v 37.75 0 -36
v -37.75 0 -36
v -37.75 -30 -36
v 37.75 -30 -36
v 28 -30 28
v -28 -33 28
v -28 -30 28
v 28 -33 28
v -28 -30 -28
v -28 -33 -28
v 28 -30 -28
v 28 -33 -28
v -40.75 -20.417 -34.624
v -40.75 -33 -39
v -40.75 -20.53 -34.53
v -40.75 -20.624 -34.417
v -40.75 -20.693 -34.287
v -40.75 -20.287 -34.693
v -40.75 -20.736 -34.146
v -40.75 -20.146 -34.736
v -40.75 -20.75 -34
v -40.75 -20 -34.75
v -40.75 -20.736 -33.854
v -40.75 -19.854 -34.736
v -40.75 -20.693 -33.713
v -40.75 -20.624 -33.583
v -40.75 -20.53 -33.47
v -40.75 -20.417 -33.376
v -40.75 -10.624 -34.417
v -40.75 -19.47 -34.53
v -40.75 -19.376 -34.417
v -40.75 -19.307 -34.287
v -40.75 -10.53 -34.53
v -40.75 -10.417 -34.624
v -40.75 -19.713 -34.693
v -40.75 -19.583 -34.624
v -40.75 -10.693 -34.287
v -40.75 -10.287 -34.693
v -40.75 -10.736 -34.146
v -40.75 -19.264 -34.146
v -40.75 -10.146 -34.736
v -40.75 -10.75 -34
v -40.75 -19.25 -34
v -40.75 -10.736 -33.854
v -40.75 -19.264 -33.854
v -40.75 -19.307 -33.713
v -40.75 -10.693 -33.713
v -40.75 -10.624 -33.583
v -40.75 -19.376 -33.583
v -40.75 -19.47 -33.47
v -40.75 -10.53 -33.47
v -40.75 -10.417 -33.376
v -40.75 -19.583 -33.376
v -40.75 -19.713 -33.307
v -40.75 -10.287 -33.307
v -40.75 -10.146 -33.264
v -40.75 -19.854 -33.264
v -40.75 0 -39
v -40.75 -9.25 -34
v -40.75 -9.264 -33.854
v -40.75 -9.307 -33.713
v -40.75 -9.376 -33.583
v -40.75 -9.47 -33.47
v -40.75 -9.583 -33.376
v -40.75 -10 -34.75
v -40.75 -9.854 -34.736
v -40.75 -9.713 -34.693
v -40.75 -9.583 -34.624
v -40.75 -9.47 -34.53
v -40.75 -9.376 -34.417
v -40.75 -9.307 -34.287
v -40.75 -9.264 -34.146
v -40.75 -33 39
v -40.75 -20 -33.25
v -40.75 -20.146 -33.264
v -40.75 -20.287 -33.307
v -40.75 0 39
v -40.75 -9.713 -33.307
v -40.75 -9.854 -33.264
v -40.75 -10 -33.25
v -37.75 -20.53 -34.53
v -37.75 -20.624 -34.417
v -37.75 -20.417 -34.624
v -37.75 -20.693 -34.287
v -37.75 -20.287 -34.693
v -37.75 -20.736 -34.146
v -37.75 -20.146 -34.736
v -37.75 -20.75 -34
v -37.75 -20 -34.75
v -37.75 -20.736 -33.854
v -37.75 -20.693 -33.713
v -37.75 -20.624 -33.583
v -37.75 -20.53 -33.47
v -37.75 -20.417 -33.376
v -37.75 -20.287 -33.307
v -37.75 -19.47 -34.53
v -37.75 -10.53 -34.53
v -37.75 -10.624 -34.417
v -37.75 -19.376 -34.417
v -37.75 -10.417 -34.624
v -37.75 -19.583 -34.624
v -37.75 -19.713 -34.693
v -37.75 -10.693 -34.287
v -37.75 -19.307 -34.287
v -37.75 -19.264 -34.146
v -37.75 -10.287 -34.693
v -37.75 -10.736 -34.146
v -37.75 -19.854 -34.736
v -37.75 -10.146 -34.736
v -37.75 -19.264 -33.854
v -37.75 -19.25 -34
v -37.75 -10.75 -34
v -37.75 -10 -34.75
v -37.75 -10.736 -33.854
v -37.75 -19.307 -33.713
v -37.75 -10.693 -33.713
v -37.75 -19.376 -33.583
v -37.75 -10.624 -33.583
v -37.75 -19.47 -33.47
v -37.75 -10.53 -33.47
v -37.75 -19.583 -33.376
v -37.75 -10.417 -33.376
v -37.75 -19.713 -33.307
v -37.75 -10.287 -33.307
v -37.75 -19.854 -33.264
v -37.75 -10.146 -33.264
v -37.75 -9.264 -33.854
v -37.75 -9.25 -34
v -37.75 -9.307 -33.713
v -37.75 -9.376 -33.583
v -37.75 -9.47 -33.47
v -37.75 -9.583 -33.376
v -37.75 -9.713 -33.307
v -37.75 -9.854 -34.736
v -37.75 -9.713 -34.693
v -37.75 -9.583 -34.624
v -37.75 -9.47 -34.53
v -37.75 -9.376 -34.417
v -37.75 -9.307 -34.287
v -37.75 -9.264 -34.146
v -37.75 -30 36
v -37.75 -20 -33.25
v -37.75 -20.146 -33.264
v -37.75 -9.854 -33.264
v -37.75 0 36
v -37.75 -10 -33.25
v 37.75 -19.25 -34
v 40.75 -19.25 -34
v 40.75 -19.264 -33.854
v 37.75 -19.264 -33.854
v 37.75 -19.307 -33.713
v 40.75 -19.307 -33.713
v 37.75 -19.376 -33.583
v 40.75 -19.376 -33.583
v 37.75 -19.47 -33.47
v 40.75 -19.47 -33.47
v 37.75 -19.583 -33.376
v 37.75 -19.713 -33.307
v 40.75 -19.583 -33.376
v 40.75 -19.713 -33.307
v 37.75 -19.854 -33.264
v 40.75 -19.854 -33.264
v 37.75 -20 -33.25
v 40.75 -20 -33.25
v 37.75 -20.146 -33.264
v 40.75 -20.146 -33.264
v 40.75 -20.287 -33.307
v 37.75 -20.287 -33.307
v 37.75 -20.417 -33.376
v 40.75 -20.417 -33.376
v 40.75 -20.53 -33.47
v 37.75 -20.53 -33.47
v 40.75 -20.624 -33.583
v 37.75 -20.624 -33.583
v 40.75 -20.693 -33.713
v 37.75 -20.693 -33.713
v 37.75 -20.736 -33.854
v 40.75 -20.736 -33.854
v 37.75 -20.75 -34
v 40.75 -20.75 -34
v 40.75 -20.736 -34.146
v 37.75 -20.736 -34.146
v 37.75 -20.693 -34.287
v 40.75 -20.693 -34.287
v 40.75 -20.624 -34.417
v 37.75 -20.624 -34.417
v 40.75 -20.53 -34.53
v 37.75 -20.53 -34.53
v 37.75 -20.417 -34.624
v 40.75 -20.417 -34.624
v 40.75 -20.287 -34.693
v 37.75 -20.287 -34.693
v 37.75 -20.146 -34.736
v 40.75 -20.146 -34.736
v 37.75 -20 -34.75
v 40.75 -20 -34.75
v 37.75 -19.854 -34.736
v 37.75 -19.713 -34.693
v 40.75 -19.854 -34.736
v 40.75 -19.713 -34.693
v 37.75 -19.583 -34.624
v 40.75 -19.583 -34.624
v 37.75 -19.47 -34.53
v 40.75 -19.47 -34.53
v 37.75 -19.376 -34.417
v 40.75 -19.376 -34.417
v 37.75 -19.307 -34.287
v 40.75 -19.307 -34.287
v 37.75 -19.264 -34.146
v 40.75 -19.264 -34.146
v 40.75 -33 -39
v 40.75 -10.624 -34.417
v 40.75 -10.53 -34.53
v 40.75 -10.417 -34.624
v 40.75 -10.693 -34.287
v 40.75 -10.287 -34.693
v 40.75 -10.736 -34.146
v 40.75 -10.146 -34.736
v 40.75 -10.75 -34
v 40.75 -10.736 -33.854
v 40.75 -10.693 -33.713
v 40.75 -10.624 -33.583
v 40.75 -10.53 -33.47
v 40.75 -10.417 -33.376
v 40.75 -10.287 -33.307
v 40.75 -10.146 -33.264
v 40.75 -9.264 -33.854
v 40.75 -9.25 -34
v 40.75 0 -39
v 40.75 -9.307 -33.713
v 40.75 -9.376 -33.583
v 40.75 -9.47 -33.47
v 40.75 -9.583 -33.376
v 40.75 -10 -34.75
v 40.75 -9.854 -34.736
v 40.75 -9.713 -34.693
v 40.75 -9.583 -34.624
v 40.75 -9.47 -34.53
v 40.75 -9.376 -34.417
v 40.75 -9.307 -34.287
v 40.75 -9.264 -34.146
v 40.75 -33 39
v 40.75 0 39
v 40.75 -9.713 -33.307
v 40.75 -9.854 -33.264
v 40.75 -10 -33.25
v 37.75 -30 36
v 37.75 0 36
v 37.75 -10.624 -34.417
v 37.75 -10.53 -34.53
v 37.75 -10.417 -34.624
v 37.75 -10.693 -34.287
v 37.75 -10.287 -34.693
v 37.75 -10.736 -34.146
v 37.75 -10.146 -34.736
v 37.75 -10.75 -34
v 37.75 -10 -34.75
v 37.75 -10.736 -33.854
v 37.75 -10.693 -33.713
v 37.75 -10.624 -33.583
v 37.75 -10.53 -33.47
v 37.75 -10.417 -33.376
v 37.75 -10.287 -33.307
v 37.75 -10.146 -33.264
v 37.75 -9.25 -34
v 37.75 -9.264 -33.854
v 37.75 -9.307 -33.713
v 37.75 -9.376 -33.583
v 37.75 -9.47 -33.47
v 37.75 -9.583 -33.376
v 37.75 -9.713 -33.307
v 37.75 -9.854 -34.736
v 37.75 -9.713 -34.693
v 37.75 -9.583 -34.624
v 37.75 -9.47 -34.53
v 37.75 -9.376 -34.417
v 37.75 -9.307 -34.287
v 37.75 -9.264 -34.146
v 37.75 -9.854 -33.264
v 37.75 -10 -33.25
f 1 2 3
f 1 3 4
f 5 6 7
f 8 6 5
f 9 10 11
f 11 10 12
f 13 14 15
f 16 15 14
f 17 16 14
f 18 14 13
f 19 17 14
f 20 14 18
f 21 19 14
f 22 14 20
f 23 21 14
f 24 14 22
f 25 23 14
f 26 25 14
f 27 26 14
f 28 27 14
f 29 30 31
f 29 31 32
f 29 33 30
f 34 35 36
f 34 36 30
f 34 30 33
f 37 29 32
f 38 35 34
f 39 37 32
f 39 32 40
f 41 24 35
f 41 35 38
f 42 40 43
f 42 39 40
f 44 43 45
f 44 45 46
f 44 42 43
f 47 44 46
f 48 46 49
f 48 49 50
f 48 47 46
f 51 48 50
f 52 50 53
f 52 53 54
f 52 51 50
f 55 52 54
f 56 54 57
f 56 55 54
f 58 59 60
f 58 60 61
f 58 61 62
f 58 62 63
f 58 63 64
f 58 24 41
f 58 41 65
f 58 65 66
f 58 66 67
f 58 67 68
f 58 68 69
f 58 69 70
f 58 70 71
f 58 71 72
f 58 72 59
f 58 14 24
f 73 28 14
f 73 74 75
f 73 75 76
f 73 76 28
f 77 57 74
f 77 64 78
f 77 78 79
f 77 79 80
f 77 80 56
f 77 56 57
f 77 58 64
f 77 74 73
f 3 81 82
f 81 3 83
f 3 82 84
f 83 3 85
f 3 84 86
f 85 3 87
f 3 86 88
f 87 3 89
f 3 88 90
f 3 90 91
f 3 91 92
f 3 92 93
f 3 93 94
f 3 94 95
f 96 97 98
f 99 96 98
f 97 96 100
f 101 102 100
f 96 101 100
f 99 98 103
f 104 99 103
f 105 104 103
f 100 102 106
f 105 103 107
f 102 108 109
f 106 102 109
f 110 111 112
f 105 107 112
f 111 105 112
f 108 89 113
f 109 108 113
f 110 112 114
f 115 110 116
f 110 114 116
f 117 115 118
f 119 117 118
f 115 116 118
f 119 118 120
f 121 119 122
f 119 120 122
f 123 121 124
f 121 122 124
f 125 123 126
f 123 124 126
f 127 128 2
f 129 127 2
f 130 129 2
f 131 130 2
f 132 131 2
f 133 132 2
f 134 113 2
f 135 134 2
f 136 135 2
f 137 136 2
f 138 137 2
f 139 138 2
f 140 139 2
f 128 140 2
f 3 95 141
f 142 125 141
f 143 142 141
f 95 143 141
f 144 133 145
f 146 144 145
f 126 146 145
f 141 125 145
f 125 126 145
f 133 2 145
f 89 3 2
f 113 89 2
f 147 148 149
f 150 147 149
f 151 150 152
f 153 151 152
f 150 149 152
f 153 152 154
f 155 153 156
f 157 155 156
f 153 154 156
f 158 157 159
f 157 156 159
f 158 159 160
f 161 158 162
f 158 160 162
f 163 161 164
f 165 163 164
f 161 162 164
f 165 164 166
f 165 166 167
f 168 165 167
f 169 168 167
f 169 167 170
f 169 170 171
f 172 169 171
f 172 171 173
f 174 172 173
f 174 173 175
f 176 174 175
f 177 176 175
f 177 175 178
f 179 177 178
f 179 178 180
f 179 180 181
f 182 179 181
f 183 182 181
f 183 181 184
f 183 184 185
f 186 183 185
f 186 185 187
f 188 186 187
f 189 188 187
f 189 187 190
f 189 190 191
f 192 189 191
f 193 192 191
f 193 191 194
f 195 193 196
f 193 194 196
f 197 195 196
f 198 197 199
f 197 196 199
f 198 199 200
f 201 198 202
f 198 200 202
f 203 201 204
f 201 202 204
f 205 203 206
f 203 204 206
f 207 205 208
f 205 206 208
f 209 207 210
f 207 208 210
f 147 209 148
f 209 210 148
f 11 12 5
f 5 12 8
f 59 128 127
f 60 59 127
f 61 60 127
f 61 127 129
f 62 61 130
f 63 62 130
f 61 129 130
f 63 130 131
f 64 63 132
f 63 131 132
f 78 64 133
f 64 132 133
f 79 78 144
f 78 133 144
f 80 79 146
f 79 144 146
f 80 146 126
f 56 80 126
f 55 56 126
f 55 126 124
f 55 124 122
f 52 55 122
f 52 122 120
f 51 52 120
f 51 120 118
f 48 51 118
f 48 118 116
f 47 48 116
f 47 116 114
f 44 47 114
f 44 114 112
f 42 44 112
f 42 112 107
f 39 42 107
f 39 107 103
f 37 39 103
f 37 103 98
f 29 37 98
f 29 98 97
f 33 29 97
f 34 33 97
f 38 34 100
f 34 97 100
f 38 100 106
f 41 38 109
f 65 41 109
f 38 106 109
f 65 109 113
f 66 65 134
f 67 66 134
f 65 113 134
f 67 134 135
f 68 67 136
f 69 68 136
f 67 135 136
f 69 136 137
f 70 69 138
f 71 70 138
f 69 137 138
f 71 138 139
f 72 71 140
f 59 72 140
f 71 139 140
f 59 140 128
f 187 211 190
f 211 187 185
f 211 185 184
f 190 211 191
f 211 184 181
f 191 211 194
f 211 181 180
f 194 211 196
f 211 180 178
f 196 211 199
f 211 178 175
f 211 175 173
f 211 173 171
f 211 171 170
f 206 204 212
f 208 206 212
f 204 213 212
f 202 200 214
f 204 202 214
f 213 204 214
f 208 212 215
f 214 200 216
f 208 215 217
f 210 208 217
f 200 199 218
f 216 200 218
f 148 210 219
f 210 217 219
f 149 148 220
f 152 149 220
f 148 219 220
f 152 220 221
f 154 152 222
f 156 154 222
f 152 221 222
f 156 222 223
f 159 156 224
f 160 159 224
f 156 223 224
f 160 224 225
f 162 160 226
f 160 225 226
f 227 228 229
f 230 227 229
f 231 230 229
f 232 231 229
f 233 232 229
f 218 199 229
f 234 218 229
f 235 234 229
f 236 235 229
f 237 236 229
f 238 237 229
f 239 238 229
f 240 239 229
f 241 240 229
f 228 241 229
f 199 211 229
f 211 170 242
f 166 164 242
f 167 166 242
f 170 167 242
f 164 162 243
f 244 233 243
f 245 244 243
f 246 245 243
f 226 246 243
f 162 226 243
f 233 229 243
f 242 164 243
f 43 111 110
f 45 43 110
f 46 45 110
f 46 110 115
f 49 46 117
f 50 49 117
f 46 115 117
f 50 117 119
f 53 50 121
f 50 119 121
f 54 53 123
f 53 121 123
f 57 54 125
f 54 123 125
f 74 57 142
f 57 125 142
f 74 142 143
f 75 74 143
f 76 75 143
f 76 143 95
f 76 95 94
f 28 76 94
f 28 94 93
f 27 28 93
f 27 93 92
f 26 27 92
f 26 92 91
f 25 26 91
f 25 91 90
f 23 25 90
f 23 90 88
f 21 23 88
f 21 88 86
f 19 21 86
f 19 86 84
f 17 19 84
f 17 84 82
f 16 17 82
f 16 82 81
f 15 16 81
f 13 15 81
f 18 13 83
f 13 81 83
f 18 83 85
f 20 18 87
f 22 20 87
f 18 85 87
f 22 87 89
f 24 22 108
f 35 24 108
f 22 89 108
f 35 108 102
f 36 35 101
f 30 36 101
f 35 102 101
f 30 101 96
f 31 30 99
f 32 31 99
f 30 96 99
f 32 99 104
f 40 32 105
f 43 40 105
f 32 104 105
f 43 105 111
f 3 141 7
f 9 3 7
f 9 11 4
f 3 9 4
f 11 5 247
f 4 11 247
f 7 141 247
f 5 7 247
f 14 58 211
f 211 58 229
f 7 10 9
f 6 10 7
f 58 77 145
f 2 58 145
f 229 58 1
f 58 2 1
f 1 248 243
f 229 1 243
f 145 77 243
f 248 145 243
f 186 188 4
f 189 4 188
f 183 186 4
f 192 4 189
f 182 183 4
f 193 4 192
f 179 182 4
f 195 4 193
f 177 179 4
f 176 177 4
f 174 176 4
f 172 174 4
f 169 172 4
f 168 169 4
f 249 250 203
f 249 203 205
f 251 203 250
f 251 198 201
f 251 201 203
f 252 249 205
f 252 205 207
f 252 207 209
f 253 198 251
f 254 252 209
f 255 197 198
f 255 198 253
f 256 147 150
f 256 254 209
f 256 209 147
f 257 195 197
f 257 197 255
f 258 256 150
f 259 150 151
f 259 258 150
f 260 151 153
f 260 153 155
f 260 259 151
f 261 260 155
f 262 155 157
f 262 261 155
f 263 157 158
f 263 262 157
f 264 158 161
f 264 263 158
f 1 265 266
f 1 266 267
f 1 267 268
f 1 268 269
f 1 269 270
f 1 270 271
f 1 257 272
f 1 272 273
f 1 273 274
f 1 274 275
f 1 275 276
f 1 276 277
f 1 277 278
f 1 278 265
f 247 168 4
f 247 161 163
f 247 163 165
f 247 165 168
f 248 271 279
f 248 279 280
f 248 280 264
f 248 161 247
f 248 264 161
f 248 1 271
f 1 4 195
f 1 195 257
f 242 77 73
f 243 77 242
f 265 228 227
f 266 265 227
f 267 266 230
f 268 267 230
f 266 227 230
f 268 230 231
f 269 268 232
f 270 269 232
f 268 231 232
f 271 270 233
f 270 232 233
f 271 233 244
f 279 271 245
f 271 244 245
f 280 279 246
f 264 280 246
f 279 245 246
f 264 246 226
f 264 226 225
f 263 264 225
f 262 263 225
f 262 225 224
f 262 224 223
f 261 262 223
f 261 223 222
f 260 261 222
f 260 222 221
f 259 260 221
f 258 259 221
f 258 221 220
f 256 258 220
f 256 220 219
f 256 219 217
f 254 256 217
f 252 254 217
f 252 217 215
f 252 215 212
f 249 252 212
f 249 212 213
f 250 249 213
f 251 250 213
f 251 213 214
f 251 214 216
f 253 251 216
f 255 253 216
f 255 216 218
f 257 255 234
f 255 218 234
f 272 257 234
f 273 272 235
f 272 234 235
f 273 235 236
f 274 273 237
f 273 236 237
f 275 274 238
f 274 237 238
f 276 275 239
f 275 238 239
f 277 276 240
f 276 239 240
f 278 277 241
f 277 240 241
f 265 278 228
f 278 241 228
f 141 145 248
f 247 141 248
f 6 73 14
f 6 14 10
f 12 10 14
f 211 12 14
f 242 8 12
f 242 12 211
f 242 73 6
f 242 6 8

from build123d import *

# Parameters (mm, degrees)
F0_W     = 81.5
F0_H     = 78
F0_W_2   = 75.5
F0_H_2   = 72
F1_DEPTH = 33
F2_W     = 81.5
F2_H     = 78
F2_W_2   = 56
F2_H_2   = 56
F3_DEPTH = 3
F4_R     = 0.75
F5_DEPTH = 111.5


with BuildPart() as f1:
    # F0 (on Front) → F1 (new body)
    with BuildSketch(Plane.XZ):
        Rectangle(F0_W, F0_H)
        Rectangle(F0_W_2, F0_H_2, mode=Mode.SUBTRACT)
    extrude(amount=F1_DEPTH)

    # F2 (on face) → F3 (join)
    with BuildSketch(Plane.XZ.offset(33)):
        Rectangle(F2_W, F2_H)
        Rectangle(F2_W_2, F2_H_2, mode=Mode.SUBTRACT)
    extrude(amount=-F3_DEPTH)

    # F4 (on face) → F5 (cut)
    with BuildSketch(Plane.YZ.offset(40.75)):
        with Locations((-10, -34)):
            Circle(F4_R)
        with Locations((-20, -34)):
            Circle(F4_R)
    extrude(amount=-F5_DEPTH, mode=Mode.SUBTRACT)


solid = f1.part
